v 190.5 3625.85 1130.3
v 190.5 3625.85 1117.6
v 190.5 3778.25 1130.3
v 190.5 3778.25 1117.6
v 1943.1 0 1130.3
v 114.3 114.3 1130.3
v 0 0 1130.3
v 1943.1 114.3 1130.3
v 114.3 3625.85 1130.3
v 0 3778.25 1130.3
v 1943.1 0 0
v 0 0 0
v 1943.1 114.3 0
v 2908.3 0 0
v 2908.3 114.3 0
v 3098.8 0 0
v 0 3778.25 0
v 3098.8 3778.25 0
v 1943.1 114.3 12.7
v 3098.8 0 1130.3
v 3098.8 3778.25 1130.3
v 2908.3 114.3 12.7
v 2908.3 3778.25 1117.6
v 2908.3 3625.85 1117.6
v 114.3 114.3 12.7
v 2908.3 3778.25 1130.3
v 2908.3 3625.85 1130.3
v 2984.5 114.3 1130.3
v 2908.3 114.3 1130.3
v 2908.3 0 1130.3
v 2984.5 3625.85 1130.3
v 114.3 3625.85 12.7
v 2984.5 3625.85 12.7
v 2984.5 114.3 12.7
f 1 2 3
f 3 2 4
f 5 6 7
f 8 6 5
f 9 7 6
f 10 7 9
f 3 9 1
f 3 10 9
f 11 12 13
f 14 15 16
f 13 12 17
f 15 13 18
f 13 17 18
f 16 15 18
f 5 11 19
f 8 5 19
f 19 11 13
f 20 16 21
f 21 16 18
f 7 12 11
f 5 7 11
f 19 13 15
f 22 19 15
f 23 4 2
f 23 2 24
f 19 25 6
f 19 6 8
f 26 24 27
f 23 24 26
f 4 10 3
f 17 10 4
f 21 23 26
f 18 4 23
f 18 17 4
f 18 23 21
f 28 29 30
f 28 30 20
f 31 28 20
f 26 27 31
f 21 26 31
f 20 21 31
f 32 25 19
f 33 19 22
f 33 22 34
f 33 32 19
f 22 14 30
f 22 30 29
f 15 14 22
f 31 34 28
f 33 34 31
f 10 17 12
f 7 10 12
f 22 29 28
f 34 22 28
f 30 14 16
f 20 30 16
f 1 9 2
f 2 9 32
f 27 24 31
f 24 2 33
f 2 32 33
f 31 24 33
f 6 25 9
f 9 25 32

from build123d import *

# Parameters (mm, degrees)
F0_W        = 2717.8
F0_H        = 152.4000000021
F0_W_2      = 965.2
F0_H_2      = 114.3
F1_DEPTH    = 1117.6
F1_FACE_W   = 3098.8
F1_FACE_H   = 3778.2500000021
F1_FACE_W_2 = 2870.2
F1_FACE_H_2 = 3511.55
F2_DEPTH    = 12.7
F3_DEPTH    = 2387.6
F4_DEPTH    = 1117.6
F5_DEPTH    = 2159


# Not quite as in the source:
# - a feature names something its author has since deleted; it is built from what else it names


with BuildPart() as f1:
    # F0 (on Top) → F1 (new body)
    with BuildSketch(Plane.XY):
        Polygon((190.5, 3778.2500000021), (0, 3778.2500000021), (0, 0), (1943.1, 0), (1943.1, 114.3), (114.3, 114.3), (114.3, 3625.85), (190.5, 3625.85), align=None)
        with Locations((1549.4, 3702.050000001)):
            Rectangle(F0_W, F0_H)
        Polygon((3098.8, 3778.2500000021), (2908.3, 3778.2500000021), (2908.3, 3625.85), (2984.5, 3625.85), (2984.5, 114.3), (2908.3, 114.3), (2908.3, 0), (3098.8, 0), align=None)
        with Locations((2425.7, 57.15)):
            Rectangle(F0_W_2, F0_H_2)
    extrude(amount=F1_DEPTH)

    # F0 (on Top) + F1_face (on face) → F2 (join)
    with BuildSketch(Plane.XY):
        Polygon((2908.3, 3625.85), (190.5, 3625.85), (114.3, 3625.85), (114.3, 114.3), (1943.1, 114.3), (2908.3, 114.3), (2984.5, 114.3), (2984.5, 3625.85), align=None)
    with BuildSketch(Plane(origin=(1549.4, 2006.9762474082, 1117.6), x_dir=(1, 0, 0), z_dir=(0, 0, 1))):
        with Locations((0, -117.8512474072)):
            Rectangle(F1_FACE_W, F1_FACE_H)
        with Locations((0, -136.9012474082)):
            Rectangle(F1_FACE_W_2, F1_FACE_H_2, mode=Mode.SUBTRACT)
    extrude(amount=F2_DEPTH)

    # F0 (on Top) → F3 (cut)
    with BuildSketch(Plane.XY):
        with Locations((1549.4, 3702.050000001)):
            Rectangle(F0_W, F0_H)
    extrude(amount=F3_DEPTH, mode=Mode.SUBTRACT)

    # F0 (on Top) → F4 (join)
    with BuildSketch(Plane.XY):
        with Locations((1549.4, 3702.050000001)):
            Rectangle(F0_W, F0_H)
    extrude(amount=F4_DEPTH)

    # F0 (on Top) → F5 (cut)
    with BuildSketch(Plane.XY):
        with Locations((2425.7, 57.15)):
            Rectangle(F0_W_2, F0_H_2)
    extrude(amount=F5_DEPTH, mode=Mode.SUBTRACT)


solid = f1.part
